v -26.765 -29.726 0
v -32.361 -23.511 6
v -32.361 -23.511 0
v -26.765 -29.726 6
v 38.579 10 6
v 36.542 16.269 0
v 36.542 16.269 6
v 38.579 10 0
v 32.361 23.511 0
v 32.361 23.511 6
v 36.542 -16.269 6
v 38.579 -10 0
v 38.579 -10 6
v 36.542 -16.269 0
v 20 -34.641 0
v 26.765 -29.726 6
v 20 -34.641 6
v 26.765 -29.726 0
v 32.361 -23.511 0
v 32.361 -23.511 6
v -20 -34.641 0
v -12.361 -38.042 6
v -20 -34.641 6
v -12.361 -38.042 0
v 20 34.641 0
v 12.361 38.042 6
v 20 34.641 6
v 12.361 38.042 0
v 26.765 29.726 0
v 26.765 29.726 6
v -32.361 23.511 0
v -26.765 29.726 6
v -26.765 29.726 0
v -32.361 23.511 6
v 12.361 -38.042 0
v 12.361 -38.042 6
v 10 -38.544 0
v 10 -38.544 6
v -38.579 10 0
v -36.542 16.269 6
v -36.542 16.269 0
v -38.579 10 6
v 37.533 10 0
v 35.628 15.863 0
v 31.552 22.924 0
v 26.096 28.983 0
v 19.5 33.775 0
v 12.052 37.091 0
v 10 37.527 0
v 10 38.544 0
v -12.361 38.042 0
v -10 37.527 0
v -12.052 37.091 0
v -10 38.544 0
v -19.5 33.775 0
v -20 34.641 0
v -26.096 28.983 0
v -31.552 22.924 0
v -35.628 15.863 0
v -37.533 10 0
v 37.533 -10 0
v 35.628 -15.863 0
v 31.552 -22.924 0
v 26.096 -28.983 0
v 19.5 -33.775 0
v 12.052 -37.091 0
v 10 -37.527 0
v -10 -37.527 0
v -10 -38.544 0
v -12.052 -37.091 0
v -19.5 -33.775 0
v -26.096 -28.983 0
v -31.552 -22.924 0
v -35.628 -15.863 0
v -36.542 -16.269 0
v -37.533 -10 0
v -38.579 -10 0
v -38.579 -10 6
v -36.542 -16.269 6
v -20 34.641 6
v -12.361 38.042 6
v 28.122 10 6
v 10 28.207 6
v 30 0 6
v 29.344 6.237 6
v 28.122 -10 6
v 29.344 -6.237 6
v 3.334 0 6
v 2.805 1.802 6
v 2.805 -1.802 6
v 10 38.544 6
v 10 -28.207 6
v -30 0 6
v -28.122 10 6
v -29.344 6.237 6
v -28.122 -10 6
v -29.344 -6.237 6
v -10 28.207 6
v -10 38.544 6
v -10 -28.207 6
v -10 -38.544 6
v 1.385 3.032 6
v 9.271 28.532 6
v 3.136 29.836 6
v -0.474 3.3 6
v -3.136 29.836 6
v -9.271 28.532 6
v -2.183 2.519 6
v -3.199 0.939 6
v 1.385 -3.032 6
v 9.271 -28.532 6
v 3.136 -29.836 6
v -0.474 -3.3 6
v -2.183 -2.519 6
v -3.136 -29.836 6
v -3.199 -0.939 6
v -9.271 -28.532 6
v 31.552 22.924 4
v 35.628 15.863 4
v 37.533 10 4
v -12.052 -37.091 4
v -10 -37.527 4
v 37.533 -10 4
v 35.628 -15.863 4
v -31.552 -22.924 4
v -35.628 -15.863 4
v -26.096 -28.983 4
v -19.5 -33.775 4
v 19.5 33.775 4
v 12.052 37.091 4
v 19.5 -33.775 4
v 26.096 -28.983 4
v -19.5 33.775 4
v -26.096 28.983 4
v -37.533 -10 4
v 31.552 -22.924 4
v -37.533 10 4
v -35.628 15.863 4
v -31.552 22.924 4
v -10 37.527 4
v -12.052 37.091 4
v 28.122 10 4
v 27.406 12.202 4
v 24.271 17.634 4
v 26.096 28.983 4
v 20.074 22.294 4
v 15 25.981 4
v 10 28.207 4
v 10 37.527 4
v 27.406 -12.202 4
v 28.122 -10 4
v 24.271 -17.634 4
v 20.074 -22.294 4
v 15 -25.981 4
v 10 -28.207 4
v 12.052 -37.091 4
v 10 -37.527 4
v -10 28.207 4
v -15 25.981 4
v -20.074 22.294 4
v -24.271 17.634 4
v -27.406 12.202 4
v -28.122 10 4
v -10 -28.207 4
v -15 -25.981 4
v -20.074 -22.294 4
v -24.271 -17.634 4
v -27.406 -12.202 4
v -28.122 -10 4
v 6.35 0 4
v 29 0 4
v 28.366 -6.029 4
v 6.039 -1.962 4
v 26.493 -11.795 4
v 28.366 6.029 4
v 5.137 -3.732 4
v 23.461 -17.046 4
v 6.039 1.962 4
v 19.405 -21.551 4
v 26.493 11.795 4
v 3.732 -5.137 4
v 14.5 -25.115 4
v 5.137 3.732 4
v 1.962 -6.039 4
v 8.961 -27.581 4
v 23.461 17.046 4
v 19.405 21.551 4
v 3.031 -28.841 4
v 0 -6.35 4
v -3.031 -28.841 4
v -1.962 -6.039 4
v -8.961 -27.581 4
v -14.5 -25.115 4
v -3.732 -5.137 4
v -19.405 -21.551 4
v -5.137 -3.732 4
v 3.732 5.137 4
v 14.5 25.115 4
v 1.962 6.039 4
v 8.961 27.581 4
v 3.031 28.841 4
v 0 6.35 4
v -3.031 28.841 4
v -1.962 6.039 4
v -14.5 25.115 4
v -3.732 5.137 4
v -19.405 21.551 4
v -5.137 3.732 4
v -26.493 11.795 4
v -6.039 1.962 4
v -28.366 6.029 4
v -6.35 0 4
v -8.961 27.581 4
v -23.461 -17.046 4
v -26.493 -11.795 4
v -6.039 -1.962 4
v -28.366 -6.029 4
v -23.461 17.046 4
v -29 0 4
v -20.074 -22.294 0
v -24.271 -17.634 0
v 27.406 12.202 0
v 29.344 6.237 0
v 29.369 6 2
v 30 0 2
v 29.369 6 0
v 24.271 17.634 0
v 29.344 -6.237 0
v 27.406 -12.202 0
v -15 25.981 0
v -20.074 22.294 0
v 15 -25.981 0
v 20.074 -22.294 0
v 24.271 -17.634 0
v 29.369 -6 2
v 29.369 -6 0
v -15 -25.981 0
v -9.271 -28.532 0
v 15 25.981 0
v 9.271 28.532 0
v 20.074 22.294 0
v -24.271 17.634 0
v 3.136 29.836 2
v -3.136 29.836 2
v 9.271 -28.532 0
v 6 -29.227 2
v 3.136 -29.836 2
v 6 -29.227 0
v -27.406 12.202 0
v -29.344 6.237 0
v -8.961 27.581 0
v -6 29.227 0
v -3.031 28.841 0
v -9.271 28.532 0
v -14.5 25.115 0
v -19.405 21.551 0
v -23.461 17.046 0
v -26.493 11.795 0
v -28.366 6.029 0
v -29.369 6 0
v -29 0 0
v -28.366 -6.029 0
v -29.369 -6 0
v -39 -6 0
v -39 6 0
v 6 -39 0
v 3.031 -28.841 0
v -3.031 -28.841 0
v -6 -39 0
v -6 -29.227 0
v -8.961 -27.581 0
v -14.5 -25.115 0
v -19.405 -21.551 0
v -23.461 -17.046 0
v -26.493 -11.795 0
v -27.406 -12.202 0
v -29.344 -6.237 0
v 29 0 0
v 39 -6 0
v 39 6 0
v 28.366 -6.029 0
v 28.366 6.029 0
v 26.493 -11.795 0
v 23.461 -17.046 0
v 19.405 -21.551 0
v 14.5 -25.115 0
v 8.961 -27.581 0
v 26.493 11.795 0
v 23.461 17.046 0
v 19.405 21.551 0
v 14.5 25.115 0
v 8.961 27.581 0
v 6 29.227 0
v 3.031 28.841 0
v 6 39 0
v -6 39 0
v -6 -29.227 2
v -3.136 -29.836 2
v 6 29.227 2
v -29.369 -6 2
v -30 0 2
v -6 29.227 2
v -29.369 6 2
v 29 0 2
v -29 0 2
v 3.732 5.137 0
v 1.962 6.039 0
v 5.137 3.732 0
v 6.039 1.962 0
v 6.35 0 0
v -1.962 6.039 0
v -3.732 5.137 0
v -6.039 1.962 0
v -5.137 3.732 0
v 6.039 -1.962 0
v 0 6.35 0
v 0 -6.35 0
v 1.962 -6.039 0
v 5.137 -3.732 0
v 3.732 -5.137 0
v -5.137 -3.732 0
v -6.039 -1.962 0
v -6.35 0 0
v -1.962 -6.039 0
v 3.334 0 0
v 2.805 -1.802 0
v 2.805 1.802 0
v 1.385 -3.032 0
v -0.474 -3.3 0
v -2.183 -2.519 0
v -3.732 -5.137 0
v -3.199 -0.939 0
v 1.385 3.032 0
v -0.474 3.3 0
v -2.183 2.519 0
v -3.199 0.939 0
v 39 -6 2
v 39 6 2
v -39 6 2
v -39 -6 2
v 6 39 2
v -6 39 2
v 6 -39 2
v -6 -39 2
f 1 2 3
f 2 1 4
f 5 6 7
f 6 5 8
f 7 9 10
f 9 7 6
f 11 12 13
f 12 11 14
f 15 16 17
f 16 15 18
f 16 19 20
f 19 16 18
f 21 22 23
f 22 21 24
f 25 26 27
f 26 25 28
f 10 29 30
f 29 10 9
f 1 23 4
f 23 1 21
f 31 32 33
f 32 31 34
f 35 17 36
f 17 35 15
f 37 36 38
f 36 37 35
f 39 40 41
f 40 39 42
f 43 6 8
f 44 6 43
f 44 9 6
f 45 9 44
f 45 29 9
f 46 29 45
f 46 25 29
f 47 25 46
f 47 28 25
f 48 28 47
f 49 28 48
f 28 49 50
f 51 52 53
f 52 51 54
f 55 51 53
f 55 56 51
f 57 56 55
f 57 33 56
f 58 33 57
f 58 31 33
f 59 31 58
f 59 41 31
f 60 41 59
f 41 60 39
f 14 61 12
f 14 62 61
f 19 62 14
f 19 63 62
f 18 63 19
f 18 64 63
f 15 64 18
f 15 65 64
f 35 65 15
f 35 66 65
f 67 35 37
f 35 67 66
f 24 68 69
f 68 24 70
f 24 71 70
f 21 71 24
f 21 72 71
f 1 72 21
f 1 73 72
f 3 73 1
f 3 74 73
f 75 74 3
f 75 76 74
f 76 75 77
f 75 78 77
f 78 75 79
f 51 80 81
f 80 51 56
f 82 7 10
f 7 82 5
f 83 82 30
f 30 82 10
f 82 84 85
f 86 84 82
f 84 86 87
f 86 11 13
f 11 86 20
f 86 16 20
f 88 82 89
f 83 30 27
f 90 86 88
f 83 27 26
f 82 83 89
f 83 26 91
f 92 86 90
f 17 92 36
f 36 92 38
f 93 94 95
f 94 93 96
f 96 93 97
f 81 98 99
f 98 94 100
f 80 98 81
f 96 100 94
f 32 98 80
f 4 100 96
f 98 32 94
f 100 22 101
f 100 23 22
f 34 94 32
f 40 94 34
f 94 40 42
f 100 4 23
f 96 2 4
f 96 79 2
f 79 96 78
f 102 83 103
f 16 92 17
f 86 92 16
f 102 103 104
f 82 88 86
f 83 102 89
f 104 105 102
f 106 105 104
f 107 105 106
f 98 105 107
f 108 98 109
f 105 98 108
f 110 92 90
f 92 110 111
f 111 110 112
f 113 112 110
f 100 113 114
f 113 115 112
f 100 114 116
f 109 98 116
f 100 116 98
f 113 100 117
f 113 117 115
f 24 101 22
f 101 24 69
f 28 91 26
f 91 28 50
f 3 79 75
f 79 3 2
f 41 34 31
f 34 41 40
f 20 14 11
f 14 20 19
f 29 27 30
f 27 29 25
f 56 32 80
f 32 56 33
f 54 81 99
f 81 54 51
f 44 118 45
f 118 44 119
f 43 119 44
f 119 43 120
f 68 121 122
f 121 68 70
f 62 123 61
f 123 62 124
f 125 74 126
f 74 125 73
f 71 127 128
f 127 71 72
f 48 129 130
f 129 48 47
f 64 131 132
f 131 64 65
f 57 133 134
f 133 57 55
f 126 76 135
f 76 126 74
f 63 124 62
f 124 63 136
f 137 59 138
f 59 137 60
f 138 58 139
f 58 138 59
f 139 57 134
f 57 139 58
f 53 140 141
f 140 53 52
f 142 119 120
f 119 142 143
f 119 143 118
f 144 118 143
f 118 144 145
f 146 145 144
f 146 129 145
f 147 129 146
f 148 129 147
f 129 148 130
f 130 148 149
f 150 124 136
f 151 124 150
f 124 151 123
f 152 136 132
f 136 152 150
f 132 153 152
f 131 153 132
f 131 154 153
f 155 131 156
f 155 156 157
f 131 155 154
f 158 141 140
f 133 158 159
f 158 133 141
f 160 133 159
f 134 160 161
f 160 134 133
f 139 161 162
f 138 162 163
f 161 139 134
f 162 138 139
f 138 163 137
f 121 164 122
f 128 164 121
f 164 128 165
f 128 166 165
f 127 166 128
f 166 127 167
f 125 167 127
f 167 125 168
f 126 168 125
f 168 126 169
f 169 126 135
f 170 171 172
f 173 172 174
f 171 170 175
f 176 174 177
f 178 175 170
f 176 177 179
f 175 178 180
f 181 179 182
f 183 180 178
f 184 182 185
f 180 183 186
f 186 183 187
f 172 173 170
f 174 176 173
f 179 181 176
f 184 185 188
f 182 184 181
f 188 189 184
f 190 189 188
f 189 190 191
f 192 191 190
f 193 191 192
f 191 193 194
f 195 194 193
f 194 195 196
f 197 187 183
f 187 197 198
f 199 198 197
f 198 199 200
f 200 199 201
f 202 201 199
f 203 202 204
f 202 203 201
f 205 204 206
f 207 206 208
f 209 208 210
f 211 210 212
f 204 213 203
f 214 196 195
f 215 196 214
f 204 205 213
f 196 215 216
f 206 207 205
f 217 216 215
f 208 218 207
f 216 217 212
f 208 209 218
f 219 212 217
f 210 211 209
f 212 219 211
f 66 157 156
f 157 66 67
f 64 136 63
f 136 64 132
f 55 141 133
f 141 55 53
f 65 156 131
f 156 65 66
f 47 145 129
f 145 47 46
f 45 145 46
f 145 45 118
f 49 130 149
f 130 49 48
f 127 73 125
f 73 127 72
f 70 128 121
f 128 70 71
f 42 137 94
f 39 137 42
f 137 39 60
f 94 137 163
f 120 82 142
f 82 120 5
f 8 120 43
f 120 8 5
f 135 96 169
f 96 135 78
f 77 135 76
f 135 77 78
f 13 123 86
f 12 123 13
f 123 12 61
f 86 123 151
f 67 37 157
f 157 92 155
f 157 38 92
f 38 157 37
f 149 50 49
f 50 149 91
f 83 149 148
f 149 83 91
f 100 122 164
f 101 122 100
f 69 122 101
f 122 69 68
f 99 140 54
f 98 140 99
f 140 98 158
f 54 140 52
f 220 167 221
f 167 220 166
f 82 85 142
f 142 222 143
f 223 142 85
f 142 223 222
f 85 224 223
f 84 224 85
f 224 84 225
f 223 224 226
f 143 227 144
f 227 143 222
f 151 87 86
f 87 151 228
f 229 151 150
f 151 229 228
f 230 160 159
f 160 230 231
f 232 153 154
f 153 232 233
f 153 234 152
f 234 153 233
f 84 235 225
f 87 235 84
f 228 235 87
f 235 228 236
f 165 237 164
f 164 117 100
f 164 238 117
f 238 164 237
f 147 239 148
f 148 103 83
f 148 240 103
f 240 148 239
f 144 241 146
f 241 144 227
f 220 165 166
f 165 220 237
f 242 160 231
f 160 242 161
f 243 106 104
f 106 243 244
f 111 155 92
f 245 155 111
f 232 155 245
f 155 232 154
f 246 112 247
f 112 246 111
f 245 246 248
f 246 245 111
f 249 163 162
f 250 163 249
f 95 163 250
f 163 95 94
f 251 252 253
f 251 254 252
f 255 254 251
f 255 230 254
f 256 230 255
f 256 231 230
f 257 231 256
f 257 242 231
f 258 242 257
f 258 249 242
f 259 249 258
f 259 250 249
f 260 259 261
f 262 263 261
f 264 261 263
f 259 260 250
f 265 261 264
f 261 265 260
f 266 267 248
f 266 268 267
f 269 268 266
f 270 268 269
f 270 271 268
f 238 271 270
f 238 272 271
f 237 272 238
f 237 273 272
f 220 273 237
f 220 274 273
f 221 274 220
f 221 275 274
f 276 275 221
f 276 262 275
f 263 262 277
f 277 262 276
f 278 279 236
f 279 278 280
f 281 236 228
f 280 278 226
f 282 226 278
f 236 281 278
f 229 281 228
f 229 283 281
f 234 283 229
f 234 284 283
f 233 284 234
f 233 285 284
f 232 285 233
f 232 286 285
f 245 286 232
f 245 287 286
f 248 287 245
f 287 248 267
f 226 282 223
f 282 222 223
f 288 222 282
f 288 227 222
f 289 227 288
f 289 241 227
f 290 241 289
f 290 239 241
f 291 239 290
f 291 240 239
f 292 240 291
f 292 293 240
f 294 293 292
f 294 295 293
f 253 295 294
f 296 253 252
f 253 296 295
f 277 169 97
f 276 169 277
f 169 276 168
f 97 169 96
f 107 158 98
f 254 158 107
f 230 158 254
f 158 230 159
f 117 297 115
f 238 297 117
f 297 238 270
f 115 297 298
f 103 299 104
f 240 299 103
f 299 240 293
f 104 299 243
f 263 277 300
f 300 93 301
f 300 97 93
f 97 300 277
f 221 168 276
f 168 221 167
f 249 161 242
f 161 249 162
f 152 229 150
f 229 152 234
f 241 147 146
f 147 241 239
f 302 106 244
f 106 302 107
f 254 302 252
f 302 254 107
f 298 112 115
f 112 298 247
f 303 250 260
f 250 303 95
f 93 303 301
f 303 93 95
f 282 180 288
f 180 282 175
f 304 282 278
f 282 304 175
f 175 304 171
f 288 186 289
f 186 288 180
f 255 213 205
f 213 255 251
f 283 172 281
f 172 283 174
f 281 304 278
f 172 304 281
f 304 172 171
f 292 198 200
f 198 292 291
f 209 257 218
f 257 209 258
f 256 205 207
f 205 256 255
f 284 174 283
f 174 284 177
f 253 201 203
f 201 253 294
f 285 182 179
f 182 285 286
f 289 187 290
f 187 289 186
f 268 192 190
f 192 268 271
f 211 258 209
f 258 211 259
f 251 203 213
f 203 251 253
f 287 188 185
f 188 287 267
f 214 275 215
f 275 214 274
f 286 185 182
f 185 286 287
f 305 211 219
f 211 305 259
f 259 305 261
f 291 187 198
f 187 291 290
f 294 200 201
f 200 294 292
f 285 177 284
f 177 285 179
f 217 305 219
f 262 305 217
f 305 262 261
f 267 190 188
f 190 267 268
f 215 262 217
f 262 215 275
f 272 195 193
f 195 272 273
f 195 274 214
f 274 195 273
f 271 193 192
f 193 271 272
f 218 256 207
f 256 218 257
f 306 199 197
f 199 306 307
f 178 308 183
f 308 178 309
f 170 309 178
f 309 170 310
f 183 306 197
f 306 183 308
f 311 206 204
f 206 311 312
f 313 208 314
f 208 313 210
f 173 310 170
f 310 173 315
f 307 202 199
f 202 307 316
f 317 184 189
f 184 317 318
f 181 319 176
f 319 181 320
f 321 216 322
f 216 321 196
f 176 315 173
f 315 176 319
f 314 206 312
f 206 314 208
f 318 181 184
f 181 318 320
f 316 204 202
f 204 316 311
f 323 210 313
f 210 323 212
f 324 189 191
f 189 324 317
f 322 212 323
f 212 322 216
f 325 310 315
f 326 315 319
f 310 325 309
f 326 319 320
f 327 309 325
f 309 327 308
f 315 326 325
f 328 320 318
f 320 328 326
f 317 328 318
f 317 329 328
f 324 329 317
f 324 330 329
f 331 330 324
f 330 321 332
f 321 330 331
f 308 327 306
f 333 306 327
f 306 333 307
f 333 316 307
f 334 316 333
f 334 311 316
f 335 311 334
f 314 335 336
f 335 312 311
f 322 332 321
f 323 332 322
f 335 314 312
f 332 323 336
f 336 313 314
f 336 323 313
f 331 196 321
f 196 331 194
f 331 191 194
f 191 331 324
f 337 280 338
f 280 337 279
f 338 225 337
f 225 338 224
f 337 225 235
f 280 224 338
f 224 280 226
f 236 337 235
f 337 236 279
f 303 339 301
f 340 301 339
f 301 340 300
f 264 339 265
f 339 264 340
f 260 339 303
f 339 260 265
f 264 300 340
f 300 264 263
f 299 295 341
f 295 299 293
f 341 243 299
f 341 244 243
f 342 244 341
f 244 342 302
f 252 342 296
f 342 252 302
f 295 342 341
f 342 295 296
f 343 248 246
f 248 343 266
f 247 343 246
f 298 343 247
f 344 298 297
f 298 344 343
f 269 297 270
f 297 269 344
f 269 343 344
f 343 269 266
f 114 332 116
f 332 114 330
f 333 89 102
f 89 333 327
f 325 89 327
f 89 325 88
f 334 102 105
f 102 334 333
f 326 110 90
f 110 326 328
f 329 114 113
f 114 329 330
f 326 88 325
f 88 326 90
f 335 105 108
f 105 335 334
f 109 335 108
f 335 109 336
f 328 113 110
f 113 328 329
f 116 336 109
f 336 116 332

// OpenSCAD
//
// Parametric spool for breadboarding fiber optic systems.
// Scott Harris

H=6;
BaseThick=2;
TabWidth=12;
SlotWidth=20;
WallThickness=1;
OD=40;
ID=30;

render()
{
	difference()
	{
		union()
		{
			
			cylinder(r=25.4/2/2, h=H, center=false);
			
			
		
			difference()
			{
				cylinder(r=OD, h=H, center=false);
				cylinder(r=OD-WallThickness, h=H-BaseThick,center=false);
				translate([0,0,0]) cube([80,SlotWidth,80], center=true);
				translate([0,0,0]) cube([SlotWidth,80,80], center=true);

			}
			difference()
			{
				cylinder(r=ID, h=H, center=false);
				cylinder(r=ID-WallThickness, h=H-BaseThick,center=false);	
				
			}
			translate([(ID+OD)/2-WallThickness,0,1]) cube([(OD-ID),TabWidth,2], center=true);
			translate([-(ID+OD)/2+WallThickness,0,1]) cube([(OD-ID),TabWidth,2], center=true);
			translate([0,(ID+OD)/2-WallThickness,1]) cube([TabWidth,(OD-ID),2], center=true);
			translate([0,-(ID+OD)/2+WallThickness,1]) cube([TabWidth,(OD-ID),2], center=true);
			
		}
		cylinder(r=1.05*25.4/2/4, h=2*H, center=false);

	}
}
